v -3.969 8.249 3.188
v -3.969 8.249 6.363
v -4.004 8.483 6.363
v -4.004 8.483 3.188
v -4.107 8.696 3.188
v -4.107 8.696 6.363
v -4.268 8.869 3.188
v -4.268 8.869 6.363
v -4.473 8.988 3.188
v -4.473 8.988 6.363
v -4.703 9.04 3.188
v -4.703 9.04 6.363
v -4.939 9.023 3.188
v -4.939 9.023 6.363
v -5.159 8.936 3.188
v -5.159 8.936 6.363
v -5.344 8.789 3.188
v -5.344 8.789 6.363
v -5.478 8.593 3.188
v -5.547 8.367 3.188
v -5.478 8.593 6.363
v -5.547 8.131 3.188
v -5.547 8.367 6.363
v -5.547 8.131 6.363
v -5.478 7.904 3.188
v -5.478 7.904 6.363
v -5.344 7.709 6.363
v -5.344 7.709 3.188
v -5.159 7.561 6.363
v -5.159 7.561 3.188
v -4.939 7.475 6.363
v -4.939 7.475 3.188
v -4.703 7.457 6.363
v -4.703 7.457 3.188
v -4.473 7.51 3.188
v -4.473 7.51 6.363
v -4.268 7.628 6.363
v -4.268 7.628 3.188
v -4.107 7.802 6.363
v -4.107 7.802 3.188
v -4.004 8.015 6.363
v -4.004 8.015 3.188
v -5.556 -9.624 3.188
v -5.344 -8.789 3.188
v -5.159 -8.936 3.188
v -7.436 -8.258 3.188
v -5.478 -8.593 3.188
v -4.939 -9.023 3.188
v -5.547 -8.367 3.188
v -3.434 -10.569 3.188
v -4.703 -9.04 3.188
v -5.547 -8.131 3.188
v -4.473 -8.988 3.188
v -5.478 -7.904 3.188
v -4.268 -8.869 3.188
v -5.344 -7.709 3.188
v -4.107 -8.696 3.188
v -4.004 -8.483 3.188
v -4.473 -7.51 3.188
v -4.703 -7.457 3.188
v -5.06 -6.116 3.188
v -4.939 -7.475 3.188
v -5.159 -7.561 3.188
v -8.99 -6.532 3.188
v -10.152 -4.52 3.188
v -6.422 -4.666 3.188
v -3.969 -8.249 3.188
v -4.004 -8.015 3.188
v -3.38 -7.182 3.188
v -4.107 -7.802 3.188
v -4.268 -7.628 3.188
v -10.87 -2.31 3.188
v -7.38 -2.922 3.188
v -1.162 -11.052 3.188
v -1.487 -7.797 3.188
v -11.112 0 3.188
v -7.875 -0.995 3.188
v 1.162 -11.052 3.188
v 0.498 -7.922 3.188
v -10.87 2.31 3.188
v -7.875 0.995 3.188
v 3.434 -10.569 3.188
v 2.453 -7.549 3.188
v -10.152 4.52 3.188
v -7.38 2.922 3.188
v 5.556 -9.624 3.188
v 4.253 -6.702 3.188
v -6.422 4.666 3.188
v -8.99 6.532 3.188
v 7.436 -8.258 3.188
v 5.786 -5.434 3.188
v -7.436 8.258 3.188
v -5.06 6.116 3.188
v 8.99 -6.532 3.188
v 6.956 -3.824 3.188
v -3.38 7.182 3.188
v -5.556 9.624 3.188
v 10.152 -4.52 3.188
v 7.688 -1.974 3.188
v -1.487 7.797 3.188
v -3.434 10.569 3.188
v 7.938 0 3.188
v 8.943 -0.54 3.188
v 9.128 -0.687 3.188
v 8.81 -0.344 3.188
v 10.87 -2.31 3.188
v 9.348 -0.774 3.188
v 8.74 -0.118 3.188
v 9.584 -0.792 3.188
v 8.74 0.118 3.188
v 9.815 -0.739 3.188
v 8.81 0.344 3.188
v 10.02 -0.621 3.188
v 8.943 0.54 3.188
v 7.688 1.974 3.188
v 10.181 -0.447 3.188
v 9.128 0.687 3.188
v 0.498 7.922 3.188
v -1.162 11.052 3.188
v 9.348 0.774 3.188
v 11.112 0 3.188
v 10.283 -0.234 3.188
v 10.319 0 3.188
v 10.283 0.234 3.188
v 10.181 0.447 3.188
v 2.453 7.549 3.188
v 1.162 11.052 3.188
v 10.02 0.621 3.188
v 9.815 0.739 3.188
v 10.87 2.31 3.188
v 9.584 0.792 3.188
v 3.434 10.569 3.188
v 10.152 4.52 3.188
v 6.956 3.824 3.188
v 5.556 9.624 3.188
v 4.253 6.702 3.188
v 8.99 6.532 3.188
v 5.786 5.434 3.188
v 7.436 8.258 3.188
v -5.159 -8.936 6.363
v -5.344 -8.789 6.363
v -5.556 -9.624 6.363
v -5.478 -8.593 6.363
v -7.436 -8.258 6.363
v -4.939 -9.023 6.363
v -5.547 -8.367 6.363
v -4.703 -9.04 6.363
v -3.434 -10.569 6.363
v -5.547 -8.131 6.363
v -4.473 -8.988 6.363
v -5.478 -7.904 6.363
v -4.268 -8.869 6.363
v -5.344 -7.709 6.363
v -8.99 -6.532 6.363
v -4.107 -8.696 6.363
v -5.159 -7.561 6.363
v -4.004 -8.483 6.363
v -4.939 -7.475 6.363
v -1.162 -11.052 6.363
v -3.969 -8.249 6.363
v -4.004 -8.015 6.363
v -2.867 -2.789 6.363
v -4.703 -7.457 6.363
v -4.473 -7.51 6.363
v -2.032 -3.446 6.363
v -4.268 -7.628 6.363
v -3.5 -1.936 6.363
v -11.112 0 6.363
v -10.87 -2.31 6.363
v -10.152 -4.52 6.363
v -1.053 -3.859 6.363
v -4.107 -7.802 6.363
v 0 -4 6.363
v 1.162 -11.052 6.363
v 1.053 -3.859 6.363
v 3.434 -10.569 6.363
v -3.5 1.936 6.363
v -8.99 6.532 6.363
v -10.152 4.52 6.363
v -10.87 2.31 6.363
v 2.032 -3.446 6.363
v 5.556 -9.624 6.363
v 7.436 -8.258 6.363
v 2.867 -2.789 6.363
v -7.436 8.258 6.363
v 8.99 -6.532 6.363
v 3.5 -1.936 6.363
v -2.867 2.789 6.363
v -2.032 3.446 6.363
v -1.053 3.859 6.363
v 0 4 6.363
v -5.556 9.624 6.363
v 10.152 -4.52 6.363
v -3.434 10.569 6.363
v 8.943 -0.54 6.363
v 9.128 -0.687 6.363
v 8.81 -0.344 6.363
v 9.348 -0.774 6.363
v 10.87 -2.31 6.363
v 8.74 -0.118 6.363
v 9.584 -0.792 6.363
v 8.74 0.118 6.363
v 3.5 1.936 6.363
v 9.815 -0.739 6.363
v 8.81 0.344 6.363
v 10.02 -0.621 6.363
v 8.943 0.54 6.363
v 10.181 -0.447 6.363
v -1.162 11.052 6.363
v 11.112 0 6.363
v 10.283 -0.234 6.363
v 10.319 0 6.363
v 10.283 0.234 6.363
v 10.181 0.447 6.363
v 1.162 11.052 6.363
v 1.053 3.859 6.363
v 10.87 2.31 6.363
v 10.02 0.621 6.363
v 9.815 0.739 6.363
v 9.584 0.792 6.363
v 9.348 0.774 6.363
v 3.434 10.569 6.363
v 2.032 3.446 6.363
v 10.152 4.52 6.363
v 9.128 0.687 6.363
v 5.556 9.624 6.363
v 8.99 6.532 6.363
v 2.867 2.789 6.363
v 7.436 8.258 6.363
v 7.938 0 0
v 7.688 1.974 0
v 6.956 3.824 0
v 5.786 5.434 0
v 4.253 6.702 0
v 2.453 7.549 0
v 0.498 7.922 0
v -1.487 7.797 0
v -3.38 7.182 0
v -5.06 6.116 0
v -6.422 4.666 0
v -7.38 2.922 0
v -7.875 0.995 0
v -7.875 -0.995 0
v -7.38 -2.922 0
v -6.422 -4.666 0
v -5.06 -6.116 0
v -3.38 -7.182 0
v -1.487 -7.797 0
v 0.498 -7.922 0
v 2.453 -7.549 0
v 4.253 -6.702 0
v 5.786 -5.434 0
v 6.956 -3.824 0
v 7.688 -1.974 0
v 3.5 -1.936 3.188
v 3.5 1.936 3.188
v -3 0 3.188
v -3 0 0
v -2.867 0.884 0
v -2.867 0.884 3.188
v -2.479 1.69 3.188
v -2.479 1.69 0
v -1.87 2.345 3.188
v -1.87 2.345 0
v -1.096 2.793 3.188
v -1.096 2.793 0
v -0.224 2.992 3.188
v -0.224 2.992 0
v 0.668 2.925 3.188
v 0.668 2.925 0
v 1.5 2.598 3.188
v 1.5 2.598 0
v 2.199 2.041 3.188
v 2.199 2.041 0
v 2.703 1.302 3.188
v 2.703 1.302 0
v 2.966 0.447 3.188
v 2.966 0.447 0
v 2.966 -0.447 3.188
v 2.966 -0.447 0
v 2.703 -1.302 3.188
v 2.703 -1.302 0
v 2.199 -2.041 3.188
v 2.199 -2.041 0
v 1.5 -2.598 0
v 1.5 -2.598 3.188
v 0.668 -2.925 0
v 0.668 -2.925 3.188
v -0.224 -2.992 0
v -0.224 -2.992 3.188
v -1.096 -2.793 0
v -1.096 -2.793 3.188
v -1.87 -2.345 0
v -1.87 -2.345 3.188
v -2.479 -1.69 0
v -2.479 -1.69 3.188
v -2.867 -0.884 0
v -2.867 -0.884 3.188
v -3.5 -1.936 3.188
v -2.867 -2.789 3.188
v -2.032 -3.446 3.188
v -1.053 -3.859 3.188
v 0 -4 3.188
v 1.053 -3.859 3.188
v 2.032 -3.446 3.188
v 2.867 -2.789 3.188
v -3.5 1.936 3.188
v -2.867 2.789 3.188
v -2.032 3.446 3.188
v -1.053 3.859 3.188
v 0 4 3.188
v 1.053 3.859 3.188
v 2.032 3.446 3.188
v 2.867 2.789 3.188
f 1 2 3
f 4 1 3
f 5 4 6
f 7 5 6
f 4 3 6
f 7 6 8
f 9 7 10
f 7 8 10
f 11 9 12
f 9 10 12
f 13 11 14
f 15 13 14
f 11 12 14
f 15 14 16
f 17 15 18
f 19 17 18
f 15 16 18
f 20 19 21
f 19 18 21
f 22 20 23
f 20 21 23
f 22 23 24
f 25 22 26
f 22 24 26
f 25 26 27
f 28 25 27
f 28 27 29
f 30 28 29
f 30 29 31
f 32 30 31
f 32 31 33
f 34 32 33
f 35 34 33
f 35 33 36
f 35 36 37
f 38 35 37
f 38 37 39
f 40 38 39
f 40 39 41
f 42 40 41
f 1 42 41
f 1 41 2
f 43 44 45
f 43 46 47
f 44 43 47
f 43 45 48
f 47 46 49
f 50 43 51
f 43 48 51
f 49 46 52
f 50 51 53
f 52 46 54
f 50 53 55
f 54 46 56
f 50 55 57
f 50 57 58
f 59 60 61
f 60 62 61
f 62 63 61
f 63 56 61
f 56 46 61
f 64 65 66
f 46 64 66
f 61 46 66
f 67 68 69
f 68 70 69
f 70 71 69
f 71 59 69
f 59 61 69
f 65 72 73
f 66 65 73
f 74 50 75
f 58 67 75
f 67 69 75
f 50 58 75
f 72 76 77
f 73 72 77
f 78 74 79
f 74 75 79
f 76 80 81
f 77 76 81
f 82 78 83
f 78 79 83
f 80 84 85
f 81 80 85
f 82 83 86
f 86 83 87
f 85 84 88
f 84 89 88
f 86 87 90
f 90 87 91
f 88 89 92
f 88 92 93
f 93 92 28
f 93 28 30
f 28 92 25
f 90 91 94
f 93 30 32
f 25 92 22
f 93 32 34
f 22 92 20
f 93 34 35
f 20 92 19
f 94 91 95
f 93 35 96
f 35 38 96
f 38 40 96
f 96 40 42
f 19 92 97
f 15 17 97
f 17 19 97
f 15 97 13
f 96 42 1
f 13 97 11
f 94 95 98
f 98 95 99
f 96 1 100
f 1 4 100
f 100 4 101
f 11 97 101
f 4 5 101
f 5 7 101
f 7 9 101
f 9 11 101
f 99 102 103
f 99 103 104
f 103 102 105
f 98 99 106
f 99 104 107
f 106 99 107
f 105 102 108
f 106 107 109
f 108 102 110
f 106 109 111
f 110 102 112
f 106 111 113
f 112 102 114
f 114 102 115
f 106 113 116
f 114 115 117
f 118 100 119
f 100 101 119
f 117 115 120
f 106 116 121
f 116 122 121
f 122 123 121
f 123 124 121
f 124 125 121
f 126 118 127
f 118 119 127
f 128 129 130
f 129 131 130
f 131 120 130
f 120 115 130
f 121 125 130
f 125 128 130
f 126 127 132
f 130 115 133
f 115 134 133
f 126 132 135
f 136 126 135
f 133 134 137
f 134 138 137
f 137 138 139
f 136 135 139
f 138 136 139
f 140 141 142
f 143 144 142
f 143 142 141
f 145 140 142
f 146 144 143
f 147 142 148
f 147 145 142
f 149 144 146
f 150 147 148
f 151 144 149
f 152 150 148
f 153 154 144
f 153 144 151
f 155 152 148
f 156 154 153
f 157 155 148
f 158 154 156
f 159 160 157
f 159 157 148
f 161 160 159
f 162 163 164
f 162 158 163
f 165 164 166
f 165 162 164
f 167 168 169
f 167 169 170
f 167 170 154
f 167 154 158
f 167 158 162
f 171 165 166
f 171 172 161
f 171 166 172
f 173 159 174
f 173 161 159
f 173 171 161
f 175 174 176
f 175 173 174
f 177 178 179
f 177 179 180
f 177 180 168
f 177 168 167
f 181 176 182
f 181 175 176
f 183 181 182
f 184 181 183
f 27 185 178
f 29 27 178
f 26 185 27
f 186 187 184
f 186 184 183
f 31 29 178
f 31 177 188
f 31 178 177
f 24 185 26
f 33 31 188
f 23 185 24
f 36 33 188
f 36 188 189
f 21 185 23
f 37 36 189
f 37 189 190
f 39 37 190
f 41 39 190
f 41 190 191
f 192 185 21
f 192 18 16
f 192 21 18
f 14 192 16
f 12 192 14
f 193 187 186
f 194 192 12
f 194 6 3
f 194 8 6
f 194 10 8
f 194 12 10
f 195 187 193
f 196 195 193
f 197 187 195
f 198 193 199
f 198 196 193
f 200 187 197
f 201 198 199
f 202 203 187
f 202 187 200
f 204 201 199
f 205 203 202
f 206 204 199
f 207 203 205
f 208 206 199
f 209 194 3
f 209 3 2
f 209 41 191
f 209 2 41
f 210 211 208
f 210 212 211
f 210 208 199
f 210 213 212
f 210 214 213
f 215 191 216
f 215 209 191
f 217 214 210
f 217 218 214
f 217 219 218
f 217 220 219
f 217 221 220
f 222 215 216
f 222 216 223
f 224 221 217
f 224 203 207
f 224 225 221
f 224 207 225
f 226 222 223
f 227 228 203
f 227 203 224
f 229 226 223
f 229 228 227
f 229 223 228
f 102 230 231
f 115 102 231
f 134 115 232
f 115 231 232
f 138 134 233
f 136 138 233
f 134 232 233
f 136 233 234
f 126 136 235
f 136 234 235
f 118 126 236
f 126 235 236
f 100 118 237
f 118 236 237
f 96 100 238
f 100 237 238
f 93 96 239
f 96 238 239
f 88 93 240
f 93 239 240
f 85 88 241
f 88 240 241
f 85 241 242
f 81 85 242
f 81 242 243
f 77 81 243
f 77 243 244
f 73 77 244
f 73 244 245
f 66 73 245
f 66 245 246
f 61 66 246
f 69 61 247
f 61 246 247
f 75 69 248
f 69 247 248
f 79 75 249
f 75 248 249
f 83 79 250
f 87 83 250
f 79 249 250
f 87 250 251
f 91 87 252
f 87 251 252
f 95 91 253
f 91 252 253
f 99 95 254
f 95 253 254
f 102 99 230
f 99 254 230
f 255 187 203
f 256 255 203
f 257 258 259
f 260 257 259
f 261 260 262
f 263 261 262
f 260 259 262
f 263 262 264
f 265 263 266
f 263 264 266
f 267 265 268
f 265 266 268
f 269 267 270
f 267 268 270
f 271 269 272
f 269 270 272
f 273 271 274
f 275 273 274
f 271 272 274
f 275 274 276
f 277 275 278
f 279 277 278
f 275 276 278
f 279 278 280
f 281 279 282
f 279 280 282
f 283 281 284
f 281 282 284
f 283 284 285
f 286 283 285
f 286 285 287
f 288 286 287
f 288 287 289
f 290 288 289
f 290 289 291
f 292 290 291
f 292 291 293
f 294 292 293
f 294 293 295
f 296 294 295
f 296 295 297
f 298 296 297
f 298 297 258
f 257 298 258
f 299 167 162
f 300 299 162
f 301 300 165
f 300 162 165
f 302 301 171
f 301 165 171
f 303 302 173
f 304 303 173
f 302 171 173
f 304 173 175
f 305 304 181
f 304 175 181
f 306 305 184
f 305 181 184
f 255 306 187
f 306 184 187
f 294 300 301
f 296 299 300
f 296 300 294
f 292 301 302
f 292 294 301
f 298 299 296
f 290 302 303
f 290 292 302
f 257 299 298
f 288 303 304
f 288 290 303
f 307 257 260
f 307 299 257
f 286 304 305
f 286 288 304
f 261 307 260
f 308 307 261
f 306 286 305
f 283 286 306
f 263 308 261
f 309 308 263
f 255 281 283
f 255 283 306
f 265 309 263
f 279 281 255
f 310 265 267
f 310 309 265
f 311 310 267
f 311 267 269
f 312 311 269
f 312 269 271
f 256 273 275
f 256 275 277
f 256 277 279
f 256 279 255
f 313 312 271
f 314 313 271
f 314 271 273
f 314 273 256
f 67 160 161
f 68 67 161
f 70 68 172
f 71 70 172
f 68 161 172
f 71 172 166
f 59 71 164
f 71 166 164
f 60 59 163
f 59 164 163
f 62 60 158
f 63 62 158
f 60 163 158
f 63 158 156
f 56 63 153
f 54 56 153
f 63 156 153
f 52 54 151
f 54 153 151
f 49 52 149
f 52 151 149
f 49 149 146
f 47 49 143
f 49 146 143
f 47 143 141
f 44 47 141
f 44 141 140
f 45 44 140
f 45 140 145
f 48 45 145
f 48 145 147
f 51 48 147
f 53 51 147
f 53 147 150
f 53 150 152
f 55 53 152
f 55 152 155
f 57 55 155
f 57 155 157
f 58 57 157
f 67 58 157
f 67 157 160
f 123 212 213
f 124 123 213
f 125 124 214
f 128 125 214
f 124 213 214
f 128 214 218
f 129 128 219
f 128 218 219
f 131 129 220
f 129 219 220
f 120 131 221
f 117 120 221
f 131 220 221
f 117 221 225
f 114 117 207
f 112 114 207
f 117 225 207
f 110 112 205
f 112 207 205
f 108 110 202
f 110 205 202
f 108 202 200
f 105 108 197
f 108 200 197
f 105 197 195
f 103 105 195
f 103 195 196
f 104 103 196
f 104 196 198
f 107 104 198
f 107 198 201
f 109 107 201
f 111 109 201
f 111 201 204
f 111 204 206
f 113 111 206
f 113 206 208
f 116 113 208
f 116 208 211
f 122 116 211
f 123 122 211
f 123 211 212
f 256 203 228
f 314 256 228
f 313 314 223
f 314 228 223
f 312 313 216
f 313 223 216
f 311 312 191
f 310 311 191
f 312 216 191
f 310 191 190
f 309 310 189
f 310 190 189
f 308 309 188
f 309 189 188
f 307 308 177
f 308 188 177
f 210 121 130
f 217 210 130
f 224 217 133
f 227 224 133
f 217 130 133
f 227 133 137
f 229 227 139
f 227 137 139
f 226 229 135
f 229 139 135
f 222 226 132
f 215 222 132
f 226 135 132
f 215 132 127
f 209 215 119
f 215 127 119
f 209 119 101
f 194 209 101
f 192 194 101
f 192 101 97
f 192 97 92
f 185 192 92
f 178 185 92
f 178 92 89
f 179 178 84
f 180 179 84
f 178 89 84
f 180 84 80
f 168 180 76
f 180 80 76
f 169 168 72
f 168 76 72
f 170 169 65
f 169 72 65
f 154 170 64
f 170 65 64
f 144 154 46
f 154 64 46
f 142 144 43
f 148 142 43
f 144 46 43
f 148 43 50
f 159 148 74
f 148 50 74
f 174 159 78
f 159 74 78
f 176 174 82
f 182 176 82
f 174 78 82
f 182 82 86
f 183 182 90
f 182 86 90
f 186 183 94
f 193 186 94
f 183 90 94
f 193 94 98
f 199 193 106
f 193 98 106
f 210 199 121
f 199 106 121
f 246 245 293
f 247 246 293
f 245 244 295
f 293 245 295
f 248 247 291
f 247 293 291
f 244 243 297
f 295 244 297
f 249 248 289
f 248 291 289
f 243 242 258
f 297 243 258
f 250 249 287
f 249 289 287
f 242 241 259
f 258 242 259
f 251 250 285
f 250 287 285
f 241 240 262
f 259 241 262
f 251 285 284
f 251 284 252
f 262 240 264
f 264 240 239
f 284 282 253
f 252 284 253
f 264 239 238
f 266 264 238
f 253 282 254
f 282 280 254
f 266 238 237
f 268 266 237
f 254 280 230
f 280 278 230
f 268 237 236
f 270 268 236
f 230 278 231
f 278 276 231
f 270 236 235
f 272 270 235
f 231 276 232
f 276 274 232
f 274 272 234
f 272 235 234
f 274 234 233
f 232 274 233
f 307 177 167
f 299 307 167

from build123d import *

# Parameters (mm, degrees)
SKETCH1_R           = 7.9375
BOSS_EXTRUDE1_DEPTH = 3.188
SKETCH2_R           = 11.1125
BOSS_EXTRUDE2_DEPTH = 3.17500635
CUT_EXTRUDE2_DEPTH  = 3.17500635
CUT_EXTRUDE3_REACH  = 18.955
SKETCH4_R           = 3
CUT_EXTRUDE5_REACH  = 18.955
SKETCH5_R           = 0.79375


with BuildPart() as part:
    # Sketch1 → Boss-Extrude1 (new body)
    with BuildSketch(Plane.XY):
        Circle(SKETCH1_R)
    extrude(amount=BOSS_EXTRUDE1_DEPTH)

    # Sketch2 → Boss-Extrude2 (add)
    with BuildSketch(Plane.XY.offset(3.188)):
        Circle(SKETCH2_R)
    extrude(amount=BOSS_EXTRUDE2_DEPTH)

    # Sketch3 → Cut-Extrude2 (cut)
    with BuildSketch(Plane.XY.offset(6.36300635)):
        with BuildLine():
            Line((3.499995393, -1.9365), (3.499995393, 1.9365))
            ThreePointArc((3.499995393, 1.9365), (0, 4), (-3.499995393, 1.9365))
            Line((-3.499995393, 1.9365), (-3.499995393, -1.9365))
            ThreePointArc((-3.499995393, -1.9365), (0, -4), (3.499995393, -1.9365))
        make_face()
    extrude(amount=-CUT_EXTRUDE2_DEPTH, mode=Mode.SUBTRACT)

    # Sketch4 → Cut-Extrude3 (cut, up to next)
    with BuildSketch(Plane(origin=(0, 0, 0), x_dir=(-1, 0, 0), z_dir=(0, 0, -1)), mode=Mode.PRIVATE) as cut_extrude3_sk1:
        Circle(SKETCH4_R)
    cut_extrude3_tool1 = extrude(cut_extrude3_sk1.sketch, amount=-CUT_EXTRUDE3_REACH, mode=Mode.PRIVATE) & part.part
    add(cut_extrude3_tool1.solids().sort_by_distance((0, 0, 0))[0], mode=Mode.SUBTRACT)

    # Sketch5 → Cut-Extrude5 (cut, up to next)
    with BuildSketch(Plane.XY.offset(6.36300635), mode=Mode.PRIVATE) as cut_extrude5_sk1:
        with Locations((-4.7625, 8.248891971)):
            Circle(SKETCH5_R)
    cut_extrude5_tool1 = extrude(cut_extrude5_sk1.sketch, amount=-CUT_EXTRUDE5_REACH, mode=Mode.PRIVATE) & part.part
    # Sketch5 → Cut-Extrude5 (cut, up to next)
    with BuildSketch(Plane.XY.offset(6.36300635), mode=Mode.PRIVATE) as cut_extrude5_sk2:
        with Locations((-4.7625, -8.248891971)):
            Circle(SKETCH5_R)
    cut_extrude5_tool2 = extrude(cut_extrude5_sk2.sketch, amount=-CUT_EXTRUDE5_REACH, mode=Mode.PRIVATE) & part.part
    # Sketch5 → Cut-Extrude5 (cut, up to next)
    with BuildSketch(Plane.XY.offset(6.36300635), mode=Mode.PRIVATE) as cut_extrude5_sk3:
        with Locations((9.525, 0)):
            Circle(SKETCH5_R)
    cut_extrude5_tool3 = extrude(cut_extrude5_sk3.sketch, amount=-CUT_EXTRUDE5_REACH, mode=Mode.PRIVATE) & part.part
    add(cut_extrude5_tool1.solids().sort_by_distance((-4.7625, 8.248892, 6.363006))[0], mode=Mode.SUBTRACT)
    add(cut_extrude5_tool2.solids().sort_by_distance((-4.7625, -8.248892, 6.363006))[0], mode=Mode.SUBTRACT)
    add(cut_extrude5_tool3.solids().sort_by_distance((9.525, 0, 6.363006))[0], mode=Mode.SUBTRACT)


solid = part.part
